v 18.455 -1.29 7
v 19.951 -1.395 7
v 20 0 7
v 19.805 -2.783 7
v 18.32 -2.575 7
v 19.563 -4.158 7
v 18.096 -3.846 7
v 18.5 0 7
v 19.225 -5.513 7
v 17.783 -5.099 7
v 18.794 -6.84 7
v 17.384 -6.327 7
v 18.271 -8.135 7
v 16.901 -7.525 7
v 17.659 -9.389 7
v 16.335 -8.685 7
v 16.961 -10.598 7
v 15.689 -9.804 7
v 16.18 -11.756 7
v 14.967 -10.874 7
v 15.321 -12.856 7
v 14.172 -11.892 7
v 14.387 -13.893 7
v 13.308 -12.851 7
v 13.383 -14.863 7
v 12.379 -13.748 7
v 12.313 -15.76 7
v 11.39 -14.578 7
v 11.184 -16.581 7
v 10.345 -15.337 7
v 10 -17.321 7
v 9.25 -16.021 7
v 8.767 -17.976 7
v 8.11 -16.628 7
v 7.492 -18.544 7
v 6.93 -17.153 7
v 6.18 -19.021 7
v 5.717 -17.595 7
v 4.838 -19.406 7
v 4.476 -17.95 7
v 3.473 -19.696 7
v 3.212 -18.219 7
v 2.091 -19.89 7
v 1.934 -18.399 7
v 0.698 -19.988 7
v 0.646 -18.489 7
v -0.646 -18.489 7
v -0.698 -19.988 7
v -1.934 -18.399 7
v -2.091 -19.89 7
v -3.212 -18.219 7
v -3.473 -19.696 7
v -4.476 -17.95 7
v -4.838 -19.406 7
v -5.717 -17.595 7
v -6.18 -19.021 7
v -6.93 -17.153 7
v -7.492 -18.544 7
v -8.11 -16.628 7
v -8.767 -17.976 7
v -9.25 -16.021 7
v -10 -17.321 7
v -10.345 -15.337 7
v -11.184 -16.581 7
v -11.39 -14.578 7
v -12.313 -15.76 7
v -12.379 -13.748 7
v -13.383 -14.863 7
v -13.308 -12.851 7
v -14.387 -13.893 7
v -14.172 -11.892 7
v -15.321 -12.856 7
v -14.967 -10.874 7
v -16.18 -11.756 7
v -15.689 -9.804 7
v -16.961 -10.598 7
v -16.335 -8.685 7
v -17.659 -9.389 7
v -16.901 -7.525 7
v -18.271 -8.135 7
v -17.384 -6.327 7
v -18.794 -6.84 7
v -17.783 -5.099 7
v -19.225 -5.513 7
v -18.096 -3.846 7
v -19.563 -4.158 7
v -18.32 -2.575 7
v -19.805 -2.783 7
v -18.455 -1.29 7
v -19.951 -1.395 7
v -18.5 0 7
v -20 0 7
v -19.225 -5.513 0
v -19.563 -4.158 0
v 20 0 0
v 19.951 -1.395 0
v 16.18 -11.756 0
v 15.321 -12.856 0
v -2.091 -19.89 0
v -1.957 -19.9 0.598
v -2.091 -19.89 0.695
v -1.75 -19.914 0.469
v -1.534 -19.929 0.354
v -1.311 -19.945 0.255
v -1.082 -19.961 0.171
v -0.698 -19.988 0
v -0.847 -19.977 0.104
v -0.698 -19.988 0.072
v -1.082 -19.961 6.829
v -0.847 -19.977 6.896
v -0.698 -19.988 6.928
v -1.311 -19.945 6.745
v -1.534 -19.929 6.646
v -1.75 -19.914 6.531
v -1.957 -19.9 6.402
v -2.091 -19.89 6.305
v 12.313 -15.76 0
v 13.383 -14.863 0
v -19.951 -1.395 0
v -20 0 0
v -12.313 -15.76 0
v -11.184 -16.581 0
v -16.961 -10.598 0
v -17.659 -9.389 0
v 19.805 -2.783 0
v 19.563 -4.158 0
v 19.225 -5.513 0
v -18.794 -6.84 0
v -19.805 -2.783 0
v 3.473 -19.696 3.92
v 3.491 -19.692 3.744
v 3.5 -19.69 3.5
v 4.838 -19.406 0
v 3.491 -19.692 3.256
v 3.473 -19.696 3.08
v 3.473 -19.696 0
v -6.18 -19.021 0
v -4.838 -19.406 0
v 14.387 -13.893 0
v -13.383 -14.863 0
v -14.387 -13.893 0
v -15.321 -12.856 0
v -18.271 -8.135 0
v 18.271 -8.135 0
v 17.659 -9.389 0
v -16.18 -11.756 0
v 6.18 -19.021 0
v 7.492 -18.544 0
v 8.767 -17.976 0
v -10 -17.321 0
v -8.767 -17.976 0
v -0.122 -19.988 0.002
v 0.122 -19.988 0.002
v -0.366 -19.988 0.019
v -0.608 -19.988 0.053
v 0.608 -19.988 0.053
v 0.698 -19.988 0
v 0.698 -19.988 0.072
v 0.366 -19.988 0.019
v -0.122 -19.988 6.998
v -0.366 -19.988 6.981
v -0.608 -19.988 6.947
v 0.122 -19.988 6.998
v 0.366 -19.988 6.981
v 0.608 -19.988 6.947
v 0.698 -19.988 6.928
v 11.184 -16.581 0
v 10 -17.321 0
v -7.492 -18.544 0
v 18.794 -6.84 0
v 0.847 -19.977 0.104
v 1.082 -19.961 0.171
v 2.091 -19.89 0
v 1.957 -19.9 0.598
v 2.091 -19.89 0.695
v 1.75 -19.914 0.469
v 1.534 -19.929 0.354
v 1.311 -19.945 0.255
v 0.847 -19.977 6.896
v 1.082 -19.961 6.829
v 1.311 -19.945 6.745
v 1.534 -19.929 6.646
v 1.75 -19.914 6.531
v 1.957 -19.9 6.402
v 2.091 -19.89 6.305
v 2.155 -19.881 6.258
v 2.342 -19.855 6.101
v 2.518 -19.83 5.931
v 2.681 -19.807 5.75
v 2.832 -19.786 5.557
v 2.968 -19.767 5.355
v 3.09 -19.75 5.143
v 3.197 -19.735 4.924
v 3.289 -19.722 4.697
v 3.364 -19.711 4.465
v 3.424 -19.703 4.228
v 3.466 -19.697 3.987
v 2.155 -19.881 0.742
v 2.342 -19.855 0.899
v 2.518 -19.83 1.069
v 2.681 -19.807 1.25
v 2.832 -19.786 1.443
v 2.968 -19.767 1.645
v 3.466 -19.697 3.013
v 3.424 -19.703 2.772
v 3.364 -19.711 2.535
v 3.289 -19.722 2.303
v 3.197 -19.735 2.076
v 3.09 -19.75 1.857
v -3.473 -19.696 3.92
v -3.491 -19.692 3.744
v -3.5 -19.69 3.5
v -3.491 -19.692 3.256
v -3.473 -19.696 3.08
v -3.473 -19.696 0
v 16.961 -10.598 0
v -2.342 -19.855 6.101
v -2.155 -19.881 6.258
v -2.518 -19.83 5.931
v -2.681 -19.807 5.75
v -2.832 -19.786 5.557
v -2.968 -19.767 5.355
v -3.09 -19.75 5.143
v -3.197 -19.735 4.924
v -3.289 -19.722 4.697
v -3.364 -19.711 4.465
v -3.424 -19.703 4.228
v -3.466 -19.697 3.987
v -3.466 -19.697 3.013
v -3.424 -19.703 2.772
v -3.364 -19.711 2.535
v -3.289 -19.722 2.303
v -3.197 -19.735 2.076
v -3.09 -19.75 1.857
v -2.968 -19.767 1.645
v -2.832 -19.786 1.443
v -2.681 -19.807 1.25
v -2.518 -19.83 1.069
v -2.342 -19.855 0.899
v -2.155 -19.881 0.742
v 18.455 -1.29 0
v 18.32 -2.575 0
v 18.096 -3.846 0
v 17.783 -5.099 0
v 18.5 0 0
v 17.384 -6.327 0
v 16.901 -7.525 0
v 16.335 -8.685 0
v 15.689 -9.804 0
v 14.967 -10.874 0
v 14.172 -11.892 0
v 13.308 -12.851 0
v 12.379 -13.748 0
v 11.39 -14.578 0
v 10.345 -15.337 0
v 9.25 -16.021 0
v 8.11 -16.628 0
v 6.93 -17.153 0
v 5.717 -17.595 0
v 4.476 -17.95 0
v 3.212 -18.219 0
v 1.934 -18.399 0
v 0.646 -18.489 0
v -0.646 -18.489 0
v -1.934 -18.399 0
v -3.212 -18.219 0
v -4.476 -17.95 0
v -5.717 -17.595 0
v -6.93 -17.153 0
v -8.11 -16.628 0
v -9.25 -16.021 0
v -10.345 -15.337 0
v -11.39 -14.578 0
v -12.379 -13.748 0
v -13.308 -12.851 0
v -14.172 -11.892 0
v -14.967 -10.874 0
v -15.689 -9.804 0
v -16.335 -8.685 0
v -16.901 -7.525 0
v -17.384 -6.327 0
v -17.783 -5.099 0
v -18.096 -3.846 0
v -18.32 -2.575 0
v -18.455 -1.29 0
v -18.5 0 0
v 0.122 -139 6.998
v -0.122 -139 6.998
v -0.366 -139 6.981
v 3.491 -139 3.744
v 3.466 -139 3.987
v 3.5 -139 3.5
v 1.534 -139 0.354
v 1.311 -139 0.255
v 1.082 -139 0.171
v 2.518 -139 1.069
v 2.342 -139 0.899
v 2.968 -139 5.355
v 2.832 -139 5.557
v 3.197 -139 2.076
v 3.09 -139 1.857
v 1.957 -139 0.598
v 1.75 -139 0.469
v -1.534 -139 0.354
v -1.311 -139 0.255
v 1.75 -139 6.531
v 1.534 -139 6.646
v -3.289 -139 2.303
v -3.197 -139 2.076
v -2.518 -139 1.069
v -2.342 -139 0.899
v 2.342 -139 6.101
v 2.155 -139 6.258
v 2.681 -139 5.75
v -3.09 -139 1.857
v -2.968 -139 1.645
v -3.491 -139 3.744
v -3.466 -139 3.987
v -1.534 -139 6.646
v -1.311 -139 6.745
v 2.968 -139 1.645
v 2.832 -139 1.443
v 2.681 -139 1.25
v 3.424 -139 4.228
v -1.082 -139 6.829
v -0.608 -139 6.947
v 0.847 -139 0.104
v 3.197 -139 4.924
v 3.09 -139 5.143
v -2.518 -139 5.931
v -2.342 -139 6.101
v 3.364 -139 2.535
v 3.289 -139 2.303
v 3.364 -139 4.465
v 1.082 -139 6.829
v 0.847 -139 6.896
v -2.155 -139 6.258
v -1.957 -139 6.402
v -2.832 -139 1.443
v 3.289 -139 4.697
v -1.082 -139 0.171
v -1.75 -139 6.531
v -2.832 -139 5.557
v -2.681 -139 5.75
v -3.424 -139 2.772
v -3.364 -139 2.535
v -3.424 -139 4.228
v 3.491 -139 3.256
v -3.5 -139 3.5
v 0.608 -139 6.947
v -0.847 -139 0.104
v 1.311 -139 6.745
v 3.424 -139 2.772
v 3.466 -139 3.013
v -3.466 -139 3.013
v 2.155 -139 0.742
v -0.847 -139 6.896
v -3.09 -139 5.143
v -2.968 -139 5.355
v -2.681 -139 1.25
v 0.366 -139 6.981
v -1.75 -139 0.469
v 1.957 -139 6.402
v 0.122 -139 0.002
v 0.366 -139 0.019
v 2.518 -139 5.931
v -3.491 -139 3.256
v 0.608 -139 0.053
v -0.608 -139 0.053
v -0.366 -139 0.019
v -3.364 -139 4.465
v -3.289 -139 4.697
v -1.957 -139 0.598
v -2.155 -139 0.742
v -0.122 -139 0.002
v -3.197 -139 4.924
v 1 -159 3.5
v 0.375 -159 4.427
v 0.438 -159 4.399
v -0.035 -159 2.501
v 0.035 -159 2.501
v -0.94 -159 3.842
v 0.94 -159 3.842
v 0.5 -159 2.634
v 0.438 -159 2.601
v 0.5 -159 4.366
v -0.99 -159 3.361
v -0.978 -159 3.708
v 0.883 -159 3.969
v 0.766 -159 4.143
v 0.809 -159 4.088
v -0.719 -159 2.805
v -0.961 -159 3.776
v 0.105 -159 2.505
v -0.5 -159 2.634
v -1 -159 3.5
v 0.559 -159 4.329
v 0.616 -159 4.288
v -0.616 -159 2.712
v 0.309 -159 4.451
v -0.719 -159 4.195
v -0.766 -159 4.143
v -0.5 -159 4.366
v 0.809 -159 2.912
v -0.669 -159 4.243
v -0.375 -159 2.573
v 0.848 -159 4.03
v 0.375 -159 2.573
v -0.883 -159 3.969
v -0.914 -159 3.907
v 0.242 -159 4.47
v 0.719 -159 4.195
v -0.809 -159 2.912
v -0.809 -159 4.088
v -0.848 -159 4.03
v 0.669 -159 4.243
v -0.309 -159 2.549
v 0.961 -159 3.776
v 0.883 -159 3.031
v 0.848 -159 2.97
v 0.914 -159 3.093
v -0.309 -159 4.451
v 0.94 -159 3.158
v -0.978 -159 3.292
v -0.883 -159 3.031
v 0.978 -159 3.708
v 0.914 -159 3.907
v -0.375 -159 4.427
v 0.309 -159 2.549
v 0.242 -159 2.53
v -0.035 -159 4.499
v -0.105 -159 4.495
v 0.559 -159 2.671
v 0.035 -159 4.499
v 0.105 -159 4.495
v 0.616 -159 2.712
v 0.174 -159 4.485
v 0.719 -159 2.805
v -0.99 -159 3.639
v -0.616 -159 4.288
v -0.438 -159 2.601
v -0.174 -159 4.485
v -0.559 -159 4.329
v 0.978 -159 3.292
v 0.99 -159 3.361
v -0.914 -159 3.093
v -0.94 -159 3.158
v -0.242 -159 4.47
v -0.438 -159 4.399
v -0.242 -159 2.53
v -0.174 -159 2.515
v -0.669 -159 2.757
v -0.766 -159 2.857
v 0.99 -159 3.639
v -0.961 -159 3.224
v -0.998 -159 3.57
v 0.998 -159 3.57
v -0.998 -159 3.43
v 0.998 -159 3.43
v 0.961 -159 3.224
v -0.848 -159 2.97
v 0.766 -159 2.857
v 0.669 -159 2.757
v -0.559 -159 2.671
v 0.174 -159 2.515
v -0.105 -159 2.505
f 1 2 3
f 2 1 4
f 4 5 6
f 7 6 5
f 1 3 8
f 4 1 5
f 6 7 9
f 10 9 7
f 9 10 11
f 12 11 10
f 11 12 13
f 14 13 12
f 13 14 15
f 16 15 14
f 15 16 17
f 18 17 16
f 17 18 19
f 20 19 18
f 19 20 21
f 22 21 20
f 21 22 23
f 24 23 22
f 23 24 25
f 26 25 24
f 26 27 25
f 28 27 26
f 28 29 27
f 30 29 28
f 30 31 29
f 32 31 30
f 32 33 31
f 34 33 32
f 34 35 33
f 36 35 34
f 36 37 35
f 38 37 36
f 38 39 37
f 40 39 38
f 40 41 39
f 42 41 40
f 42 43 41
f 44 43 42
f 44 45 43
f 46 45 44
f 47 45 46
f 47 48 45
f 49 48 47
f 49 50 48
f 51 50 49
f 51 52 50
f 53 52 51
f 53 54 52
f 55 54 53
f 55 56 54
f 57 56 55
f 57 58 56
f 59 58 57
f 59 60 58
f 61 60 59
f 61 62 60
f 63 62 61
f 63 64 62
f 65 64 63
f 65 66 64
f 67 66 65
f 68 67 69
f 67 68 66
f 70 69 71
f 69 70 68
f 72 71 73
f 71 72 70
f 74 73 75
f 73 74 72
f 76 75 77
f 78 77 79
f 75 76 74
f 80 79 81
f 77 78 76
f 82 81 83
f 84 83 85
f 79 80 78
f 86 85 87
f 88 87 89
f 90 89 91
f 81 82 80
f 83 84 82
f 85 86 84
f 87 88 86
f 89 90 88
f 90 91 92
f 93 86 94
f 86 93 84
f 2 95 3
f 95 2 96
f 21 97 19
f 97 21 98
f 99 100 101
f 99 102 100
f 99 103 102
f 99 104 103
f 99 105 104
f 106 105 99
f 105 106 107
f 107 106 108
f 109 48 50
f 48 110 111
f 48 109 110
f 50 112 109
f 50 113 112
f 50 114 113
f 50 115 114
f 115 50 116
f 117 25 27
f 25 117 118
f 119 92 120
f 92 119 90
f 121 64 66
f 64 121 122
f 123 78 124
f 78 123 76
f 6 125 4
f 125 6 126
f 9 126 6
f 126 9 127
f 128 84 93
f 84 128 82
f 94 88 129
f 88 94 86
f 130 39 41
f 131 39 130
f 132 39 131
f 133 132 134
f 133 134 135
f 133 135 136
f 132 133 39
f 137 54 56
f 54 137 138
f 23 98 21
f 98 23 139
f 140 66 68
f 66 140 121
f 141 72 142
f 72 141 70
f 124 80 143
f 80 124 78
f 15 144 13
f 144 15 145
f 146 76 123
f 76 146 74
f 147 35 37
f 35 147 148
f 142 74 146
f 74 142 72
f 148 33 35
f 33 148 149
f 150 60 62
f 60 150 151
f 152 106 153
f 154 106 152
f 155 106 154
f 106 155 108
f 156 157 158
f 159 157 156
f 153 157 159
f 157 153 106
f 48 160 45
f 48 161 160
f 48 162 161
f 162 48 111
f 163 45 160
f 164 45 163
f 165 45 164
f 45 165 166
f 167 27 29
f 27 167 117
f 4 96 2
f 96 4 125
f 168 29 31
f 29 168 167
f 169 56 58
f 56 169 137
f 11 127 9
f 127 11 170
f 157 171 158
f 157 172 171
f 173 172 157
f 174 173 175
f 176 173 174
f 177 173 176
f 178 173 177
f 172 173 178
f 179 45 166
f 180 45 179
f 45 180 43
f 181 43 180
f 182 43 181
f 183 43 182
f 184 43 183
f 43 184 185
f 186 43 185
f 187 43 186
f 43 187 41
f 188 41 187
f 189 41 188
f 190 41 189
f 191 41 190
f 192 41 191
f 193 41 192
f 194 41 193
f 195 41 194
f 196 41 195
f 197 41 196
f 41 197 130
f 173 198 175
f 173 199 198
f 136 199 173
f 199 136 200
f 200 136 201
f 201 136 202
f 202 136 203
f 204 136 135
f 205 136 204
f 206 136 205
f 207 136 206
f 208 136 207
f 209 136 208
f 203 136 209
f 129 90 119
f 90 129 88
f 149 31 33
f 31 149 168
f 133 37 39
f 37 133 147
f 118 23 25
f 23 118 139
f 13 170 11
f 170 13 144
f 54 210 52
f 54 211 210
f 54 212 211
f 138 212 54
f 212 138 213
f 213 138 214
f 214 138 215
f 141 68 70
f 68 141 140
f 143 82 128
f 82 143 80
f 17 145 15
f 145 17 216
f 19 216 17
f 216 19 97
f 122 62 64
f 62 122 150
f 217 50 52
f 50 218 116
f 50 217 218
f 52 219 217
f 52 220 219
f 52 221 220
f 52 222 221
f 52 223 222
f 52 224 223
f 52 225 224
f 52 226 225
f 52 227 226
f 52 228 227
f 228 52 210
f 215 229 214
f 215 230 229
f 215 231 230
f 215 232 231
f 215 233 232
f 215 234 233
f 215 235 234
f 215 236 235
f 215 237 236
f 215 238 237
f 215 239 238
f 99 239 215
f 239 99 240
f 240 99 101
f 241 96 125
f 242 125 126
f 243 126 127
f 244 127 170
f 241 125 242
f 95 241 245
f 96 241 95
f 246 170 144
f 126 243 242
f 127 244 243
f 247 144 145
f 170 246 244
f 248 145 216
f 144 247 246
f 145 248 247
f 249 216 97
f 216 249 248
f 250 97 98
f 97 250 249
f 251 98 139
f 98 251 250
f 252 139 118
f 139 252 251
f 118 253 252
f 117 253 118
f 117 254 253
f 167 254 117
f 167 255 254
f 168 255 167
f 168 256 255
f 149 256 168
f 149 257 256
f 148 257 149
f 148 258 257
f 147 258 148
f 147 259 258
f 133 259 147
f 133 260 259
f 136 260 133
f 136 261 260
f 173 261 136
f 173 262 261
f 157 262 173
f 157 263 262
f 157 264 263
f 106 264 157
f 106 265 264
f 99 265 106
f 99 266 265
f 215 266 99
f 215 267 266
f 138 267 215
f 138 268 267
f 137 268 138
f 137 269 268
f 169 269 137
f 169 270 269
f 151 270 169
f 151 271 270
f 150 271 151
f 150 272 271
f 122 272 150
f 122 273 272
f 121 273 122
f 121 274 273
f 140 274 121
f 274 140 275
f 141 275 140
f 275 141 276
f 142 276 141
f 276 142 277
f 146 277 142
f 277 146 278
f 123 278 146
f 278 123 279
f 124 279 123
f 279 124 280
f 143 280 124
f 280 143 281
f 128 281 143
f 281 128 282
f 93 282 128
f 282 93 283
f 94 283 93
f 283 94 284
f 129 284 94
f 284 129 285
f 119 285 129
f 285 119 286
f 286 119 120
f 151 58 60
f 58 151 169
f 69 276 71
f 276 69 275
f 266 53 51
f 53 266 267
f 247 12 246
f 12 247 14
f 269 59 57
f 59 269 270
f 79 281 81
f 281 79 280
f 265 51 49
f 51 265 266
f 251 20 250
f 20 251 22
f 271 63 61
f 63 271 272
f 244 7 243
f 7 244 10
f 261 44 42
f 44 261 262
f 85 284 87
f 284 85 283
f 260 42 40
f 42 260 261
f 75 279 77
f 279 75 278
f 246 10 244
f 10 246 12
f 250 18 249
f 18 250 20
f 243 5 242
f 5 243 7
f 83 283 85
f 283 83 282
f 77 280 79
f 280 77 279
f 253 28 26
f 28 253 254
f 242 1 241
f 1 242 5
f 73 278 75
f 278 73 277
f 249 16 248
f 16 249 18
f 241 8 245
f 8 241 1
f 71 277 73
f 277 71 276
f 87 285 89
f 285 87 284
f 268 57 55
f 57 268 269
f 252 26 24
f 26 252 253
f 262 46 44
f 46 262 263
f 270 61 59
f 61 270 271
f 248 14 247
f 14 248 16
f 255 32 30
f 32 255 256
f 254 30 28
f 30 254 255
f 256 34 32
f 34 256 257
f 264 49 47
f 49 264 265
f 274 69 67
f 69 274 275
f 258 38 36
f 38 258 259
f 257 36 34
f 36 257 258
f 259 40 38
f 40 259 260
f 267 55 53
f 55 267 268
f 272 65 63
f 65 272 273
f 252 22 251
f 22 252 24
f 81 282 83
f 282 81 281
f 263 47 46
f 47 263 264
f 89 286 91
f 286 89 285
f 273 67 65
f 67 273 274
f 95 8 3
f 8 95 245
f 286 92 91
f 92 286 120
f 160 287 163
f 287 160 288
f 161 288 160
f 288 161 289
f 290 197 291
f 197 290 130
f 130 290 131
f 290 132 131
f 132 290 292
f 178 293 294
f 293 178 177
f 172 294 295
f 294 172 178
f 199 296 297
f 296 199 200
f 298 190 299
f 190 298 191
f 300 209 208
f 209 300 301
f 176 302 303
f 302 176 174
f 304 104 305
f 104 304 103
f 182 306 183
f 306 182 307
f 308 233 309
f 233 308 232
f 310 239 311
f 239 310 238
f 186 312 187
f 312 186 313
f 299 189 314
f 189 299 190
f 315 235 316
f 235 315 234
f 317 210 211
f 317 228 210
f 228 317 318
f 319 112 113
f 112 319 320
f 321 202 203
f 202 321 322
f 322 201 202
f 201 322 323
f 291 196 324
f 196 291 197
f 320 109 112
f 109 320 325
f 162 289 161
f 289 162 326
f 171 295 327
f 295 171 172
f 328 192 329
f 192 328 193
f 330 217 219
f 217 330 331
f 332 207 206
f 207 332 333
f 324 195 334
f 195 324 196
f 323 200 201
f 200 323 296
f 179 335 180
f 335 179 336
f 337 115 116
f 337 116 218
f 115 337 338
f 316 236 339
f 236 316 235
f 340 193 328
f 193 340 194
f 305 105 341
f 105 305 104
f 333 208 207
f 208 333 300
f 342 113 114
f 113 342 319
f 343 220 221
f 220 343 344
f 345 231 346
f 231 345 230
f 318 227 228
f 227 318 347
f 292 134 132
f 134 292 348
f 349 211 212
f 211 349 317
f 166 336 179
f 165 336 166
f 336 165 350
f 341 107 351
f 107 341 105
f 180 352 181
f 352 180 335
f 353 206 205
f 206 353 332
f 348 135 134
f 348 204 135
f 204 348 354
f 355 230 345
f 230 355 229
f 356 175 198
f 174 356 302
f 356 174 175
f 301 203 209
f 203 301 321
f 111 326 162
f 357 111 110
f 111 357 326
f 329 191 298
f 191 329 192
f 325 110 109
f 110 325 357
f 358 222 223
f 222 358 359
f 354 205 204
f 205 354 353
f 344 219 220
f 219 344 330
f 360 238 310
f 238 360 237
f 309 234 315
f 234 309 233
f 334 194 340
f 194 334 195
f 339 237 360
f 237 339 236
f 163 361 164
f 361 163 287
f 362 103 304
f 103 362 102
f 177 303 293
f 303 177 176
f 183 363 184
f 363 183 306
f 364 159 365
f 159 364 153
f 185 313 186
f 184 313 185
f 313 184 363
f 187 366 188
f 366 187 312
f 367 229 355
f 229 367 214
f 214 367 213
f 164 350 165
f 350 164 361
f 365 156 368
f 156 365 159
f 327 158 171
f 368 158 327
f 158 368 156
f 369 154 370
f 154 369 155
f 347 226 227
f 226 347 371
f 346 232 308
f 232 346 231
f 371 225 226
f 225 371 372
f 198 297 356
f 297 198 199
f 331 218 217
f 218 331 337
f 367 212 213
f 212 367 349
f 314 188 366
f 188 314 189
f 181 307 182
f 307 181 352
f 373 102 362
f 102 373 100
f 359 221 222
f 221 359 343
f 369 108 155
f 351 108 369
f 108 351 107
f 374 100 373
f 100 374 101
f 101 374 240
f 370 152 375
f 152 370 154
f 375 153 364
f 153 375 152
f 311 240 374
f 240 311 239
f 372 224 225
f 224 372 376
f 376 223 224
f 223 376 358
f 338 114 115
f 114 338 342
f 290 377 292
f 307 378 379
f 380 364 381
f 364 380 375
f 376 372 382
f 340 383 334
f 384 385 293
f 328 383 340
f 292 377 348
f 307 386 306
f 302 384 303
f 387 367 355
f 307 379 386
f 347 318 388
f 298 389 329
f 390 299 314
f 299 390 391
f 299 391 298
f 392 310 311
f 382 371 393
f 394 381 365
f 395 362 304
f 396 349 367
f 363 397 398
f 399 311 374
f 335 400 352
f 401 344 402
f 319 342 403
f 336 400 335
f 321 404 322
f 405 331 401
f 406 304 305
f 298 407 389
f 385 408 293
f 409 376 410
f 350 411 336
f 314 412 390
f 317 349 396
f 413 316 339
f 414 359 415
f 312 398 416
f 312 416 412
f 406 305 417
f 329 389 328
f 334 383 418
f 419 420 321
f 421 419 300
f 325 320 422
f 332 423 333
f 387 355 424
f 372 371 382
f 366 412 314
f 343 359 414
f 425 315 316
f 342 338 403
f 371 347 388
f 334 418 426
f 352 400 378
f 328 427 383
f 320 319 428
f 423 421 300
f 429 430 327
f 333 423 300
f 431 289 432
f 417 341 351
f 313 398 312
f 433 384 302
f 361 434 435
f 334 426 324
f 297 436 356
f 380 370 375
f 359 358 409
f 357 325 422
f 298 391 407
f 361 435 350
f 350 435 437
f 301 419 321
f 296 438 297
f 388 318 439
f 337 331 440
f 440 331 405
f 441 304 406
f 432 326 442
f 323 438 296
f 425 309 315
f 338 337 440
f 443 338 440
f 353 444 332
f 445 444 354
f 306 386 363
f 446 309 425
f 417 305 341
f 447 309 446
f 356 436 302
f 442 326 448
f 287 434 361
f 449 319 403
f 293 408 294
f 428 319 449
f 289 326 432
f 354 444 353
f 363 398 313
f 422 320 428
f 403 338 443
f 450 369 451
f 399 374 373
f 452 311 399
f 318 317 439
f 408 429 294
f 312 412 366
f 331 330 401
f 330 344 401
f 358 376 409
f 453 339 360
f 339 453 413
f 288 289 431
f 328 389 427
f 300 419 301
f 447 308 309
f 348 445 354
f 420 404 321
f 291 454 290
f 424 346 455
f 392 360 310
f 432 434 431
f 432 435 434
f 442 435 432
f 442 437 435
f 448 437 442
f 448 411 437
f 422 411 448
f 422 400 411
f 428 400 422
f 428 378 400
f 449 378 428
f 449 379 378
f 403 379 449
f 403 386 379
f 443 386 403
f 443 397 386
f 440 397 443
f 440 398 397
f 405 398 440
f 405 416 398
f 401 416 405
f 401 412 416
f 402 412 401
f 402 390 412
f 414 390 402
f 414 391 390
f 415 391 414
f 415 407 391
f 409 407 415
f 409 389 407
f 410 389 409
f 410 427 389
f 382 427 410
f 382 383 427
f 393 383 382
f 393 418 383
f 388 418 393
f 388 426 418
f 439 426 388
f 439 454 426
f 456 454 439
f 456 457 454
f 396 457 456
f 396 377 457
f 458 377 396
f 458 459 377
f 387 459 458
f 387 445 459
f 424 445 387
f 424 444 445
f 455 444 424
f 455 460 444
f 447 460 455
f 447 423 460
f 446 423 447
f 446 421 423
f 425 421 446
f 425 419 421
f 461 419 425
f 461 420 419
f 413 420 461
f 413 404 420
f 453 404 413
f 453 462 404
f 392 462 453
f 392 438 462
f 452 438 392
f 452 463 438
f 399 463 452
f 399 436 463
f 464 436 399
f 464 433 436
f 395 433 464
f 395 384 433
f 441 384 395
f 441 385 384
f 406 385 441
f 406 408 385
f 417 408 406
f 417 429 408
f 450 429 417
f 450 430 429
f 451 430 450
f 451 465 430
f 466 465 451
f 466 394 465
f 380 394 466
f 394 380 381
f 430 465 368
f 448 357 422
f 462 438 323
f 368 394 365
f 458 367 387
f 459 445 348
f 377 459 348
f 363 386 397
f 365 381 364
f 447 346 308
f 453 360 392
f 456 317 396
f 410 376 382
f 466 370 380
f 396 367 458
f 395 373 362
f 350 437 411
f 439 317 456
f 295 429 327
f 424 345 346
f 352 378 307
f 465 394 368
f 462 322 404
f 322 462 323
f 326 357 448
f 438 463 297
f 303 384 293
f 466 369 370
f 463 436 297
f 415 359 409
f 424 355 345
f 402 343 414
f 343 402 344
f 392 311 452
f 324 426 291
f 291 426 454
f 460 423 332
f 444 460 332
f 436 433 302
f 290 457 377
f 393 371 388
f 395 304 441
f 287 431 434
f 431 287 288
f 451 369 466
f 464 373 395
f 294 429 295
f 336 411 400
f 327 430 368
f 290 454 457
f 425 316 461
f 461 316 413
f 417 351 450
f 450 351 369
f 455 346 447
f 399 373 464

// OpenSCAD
$fn = 90;

difference() {
    cylinder(d = 40, h = 7);
    translate([0, 0, -1]) cylinder(d = 37, h = 12);
    translate([-20, 0, -1]) cube([50, 20, 50]);
}

translate([0, -19, 3.5]) rotate([90, 0, 0]) cylinder(d = 7, h = 120);
translate([0, -139, 3.5]) rotate([90, 0, 0]) cylinder(d1 = 7, d2 = 2, h = 20);
